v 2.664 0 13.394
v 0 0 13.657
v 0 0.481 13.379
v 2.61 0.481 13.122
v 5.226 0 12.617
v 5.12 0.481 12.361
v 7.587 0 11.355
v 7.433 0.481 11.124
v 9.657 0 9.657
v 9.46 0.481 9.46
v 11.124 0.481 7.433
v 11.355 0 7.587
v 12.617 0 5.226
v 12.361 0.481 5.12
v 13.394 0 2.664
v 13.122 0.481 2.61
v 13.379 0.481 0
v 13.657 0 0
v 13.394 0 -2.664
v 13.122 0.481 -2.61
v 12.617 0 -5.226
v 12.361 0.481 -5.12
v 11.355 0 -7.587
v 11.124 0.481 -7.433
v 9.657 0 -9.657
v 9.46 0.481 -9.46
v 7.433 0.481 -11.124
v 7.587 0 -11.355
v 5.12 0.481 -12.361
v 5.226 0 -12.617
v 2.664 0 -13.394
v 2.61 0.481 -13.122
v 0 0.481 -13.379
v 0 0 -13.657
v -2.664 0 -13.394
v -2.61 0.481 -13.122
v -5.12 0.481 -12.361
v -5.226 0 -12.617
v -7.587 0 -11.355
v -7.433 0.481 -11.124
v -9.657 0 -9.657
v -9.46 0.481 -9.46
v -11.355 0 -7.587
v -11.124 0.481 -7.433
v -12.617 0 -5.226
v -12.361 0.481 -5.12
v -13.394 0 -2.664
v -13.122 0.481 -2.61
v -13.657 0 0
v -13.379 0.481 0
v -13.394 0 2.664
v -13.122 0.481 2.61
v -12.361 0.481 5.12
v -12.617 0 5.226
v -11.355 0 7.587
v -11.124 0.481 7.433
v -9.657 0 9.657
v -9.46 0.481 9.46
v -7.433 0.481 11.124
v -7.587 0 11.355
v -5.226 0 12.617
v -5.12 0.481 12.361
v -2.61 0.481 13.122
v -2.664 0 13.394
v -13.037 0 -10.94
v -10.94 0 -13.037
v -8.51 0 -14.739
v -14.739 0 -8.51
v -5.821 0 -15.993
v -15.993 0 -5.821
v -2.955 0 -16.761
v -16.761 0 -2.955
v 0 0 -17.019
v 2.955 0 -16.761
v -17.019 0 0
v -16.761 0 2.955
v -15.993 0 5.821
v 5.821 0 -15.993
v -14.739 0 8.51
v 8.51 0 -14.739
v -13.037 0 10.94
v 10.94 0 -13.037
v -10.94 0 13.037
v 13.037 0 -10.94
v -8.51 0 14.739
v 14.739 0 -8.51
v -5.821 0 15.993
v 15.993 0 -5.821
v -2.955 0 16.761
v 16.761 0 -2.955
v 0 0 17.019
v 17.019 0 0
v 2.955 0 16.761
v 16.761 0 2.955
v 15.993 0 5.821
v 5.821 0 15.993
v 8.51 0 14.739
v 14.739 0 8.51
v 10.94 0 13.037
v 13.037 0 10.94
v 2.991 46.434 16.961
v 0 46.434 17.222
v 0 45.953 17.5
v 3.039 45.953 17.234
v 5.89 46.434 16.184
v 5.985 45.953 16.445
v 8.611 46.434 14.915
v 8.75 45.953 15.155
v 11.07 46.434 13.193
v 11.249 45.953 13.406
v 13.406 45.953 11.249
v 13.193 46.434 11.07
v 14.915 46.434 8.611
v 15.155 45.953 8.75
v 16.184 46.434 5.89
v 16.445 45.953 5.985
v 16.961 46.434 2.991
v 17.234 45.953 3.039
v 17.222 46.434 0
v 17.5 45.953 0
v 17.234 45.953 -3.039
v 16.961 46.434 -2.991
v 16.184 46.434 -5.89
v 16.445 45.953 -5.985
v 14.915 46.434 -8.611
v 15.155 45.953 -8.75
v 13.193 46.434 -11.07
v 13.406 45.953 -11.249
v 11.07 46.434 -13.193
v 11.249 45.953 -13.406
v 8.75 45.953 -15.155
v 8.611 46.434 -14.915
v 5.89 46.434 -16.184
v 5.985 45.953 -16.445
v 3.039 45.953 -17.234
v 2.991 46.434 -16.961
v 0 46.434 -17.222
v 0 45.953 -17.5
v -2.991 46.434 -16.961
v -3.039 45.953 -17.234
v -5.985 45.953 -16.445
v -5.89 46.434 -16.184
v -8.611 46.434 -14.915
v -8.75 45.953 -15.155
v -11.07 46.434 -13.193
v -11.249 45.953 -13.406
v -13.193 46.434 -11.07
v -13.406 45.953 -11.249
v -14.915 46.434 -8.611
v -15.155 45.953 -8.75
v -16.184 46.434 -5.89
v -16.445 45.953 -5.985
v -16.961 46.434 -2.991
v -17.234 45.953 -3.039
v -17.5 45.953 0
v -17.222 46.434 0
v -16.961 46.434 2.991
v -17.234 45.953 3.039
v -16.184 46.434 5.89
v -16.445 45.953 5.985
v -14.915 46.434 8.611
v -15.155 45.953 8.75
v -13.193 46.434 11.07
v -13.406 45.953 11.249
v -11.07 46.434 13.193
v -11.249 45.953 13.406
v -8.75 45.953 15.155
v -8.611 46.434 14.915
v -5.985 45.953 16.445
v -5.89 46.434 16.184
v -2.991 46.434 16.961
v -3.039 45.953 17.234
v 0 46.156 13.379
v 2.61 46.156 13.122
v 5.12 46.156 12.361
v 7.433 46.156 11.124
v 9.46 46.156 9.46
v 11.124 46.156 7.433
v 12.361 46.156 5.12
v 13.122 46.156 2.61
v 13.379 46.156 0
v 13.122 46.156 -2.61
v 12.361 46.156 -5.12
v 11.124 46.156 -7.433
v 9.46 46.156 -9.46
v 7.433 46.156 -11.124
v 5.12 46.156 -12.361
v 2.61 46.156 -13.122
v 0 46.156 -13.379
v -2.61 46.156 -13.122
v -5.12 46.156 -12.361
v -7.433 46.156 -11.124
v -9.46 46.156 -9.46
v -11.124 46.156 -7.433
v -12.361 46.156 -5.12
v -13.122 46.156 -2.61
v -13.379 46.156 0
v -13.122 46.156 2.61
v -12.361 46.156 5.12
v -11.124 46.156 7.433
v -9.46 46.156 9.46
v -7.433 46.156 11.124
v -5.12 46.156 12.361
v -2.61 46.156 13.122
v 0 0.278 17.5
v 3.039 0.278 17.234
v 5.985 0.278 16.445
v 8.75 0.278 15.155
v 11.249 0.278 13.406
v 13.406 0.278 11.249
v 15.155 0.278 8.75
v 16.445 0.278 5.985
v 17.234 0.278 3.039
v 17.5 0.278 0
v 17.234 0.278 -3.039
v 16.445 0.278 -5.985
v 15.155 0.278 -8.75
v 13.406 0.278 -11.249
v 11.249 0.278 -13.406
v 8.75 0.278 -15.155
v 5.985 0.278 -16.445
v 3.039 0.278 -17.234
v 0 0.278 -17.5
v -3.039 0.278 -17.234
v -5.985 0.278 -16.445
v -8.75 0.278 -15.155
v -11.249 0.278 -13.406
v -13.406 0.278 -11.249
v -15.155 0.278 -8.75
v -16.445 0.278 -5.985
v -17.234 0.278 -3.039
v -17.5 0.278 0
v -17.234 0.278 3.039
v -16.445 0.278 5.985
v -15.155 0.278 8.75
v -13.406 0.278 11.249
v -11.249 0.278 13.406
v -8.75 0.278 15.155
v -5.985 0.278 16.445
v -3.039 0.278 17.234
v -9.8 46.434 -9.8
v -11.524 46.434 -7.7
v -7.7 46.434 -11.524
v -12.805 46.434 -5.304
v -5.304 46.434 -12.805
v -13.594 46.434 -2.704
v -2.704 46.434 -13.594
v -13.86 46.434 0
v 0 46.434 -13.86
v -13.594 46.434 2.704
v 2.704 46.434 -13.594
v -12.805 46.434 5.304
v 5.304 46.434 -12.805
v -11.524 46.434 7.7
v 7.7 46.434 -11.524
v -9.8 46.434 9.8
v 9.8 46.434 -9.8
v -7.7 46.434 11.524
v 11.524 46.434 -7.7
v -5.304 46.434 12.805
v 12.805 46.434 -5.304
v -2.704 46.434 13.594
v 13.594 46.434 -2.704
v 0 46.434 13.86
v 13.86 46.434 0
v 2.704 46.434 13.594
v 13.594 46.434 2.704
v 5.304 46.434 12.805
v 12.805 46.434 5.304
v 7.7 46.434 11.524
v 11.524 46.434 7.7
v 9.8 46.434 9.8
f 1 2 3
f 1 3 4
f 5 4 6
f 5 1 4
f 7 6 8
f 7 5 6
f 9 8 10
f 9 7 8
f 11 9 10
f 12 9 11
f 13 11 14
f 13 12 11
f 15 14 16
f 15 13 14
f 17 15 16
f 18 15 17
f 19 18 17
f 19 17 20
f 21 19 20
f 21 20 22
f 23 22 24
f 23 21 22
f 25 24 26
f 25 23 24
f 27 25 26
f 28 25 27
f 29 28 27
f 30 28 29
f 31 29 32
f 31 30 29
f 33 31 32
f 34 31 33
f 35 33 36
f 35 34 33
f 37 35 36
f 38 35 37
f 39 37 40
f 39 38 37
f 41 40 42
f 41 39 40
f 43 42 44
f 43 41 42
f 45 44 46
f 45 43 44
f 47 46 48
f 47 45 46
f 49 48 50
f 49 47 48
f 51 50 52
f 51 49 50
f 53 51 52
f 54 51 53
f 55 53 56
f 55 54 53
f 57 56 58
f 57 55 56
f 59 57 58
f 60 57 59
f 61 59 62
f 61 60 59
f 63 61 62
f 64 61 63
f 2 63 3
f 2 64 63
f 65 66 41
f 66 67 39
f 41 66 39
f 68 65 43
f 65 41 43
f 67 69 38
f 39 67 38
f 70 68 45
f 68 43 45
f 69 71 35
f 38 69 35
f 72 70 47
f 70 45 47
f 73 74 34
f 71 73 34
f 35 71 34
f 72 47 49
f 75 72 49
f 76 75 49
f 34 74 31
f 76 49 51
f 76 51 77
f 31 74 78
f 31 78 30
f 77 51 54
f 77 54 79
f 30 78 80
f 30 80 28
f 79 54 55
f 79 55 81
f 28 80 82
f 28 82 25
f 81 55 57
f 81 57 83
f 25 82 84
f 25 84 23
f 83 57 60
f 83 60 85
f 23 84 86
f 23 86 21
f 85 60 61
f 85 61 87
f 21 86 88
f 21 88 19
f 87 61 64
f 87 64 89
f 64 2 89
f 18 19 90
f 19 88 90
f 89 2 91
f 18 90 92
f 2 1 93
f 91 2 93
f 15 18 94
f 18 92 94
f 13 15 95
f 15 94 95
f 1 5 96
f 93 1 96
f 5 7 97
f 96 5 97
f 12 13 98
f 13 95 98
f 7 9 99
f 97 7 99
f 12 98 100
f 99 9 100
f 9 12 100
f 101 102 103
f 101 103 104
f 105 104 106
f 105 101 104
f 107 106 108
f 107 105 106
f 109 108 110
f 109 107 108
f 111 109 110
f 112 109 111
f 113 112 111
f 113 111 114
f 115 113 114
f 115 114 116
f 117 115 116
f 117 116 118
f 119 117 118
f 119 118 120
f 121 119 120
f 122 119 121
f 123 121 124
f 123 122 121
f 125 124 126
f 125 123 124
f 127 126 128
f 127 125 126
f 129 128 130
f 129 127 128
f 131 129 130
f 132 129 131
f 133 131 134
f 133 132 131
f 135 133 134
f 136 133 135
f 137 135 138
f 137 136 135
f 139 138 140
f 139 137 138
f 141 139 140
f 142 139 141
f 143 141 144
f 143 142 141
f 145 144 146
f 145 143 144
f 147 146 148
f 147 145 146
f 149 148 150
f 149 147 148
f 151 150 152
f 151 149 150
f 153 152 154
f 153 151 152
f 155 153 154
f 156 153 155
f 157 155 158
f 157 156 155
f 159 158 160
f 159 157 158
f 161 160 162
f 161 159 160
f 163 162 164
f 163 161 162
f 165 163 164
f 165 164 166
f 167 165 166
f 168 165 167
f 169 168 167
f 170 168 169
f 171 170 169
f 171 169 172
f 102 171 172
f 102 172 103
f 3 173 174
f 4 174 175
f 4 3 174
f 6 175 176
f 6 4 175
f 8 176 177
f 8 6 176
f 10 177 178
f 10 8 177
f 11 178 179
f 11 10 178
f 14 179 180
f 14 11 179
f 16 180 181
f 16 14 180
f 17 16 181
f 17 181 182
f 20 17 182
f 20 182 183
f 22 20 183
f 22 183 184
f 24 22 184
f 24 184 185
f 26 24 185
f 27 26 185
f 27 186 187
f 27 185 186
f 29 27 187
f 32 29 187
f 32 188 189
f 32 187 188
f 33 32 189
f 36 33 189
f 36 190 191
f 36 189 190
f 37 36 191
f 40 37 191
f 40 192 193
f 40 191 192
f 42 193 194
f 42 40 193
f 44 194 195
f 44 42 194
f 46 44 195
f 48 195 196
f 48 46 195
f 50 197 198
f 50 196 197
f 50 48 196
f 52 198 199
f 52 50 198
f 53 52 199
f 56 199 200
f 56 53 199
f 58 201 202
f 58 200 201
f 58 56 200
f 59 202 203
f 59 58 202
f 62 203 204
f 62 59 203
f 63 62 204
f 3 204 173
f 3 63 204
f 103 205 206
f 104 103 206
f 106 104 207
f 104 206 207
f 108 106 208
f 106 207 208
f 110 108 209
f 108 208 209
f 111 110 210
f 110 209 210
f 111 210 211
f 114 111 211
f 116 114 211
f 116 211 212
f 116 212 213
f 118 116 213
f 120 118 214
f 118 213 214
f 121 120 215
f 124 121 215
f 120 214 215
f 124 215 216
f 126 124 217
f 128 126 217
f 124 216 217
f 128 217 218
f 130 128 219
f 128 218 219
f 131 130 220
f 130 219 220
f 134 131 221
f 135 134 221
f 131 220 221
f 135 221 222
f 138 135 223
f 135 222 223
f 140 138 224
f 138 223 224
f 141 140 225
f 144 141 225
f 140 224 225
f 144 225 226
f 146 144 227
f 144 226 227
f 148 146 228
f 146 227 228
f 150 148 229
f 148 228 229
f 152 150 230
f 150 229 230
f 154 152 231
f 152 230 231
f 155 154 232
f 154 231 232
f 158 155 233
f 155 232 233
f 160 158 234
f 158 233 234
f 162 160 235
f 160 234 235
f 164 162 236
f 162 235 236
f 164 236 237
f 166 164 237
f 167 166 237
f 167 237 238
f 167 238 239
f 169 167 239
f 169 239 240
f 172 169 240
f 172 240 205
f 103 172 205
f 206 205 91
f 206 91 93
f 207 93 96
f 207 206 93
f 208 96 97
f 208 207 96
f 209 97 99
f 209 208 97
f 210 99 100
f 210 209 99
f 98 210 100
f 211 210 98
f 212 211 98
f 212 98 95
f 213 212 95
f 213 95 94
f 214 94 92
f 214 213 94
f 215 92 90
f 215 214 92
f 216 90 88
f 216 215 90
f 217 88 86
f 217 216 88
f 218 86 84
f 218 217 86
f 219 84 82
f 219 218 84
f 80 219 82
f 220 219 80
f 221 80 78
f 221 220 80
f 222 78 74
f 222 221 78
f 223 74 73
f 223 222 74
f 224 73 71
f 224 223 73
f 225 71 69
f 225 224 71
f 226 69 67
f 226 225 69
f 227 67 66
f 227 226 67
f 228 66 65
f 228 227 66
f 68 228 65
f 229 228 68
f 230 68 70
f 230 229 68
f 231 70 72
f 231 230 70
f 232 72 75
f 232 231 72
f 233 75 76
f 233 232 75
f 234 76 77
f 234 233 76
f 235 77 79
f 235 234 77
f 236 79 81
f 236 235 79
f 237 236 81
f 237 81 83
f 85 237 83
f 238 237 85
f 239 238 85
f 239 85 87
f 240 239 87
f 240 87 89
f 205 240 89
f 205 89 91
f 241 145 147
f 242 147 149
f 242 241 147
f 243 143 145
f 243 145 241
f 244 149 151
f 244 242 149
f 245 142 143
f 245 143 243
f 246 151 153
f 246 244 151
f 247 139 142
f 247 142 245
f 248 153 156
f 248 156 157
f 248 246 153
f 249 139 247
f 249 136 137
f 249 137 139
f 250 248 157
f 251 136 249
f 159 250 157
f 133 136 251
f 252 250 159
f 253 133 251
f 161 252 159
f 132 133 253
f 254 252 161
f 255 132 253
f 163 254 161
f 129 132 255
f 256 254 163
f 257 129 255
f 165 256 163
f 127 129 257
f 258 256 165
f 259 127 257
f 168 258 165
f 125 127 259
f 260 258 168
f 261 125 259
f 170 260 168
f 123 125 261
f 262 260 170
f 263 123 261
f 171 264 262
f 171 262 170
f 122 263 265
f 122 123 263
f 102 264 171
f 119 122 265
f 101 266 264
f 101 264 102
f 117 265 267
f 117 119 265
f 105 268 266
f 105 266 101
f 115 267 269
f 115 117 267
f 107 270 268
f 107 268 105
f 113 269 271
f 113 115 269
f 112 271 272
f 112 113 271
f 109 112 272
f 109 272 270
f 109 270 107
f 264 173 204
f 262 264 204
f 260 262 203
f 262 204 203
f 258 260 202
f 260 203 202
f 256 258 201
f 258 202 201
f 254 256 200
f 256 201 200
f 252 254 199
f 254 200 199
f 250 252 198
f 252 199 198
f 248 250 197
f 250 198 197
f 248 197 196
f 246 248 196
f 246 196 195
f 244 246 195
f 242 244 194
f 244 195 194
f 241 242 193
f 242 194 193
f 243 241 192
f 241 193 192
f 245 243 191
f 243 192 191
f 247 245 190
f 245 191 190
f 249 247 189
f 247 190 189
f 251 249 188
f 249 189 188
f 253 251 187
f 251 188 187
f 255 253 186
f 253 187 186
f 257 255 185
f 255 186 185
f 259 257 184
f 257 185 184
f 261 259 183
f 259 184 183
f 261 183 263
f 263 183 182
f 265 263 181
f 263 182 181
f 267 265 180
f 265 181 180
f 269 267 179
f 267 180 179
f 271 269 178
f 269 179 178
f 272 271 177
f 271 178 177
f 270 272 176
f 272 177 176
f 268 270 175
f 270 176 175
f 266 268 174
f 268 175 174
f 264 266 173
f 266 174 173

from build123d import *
from OCP.BRepFilletAPI import BRepFilletAPI_MakeChamfer

# Parameters (mm, degrees)
SKETCH1_R           = 17.5
BOSS_EXTRUDE1_DEPTH = 46.433616193
SKETCH2_R           = 13.379062462
CUT_EXTRUDE1_DEPTH  = 53.617304309
CHAMFER1_SIZE       = 0.480922512
CHAMFER1_SIZE2      = 0.277660742


with BuildPart() as part:
    # Sketch1 → Boss-Extrude1 (new body)
    with BuildSketch(Plane(origin=(0, 0, 0), x_dir=(1, 0, 0), z_dir=(0, 1, 0))):
        Circle(SKETCH1_R)
    extrude(amount=BOSS_EXTRUDE1_DEPTH)

    # Sketch2 → Cut-Extrude1 (cut, through all)
    with BuildSketch(Plane(origin=(0, 0, 0), x_dir=(1, 0, 0), z_dir=(0, 1, 0))):
        Circle(SKETCH2_R)
    extrude(amount=CUT_EXTRUDE1_DEPTH, mode=Mode.SUBTRACT)

    # Chamfer1: one chamfer whose edges measure the first distance from different faces: ONE call of the kernel's chamfer builder (chamfer() names one face for all edges)
    chamfer1_edges_1 = [part.edges().sort_by_distance(p)[0] for p in [
        (-13.379062462, 46.433616193, 0),
    ]]
    chamfer1_side_1 = [part.faces().sort_by_distance(p)[0] for p in [
        (-17.005025253, 46.433616193, 0),
    ]]
    chamfer1_edges_2 = [part.edges().sort_by_distance(p)[0] for p in [
        (-13.379062462, 0, 0),
    ]]
    chamfer1_side_2 = [part.faces().sort_by_distance(p)[0] for p in [
        (-13.379062462, 23.216808096, 0),
    ]]
    chamfer1_edges_3 = [part.edges().sort_by_distance(p)[0] for p in [
        (-17.5, 0, 0),
    ]]
    chamfer1_side_3 = [part.faces().sort_by_distance(p)[0] for p in [
        (-17.005025253, 0, 0),
    ]]
    chamfer1_edges_4 = [part.edges().sort_by_distance(p)[0] for p in [
        (-17.5, 46.433616193, 0),
    ]]
    chamfer1_side_4 = [part.faces().sort_by_distance(p)[0] for p in [
        (-17.5, 23.216808096, 0),
    ]]
    chamfer1 = BRepFilletAPI_MakeChamfer(part.part.solid().wrapped)
    for e in chamfer1_edges_1:
        chamfer1.Add(CHAMFER1_SIZE, CHAMFER1_SIZE2, e.wrapped, chamfer1_side_1[0].wrapped)  # the first distance lies on this face
    for e in chamfer1_edges_2:
        chamfer1.Add(CHAMFER1_SIZE, CHAMFER1_SIZE2, e.wrapped, chamfer1_side_2[0].wrapped)  # the first distance lies on this face
    for e in chamfer1_edges_3:
        chamfer1.Add(CHAMFER1_SIZE, CHAMFER1_SIZE2, e.wrapped, chamfer1_side_3[0].wrapped)  # the first distance lies on this face
    for e in chamfer1_edges_4:
        chamfer1.Add(CHAMFER1_SIZE, CHAMFER1_SIZE2, e.wrapped, chamfer1_side_4[0].wrapped)  # the first distance lies on this face
    add(Compound.cast(chamfer1.Shape()), mode=Mode.REPLACE)


solid = part.part
